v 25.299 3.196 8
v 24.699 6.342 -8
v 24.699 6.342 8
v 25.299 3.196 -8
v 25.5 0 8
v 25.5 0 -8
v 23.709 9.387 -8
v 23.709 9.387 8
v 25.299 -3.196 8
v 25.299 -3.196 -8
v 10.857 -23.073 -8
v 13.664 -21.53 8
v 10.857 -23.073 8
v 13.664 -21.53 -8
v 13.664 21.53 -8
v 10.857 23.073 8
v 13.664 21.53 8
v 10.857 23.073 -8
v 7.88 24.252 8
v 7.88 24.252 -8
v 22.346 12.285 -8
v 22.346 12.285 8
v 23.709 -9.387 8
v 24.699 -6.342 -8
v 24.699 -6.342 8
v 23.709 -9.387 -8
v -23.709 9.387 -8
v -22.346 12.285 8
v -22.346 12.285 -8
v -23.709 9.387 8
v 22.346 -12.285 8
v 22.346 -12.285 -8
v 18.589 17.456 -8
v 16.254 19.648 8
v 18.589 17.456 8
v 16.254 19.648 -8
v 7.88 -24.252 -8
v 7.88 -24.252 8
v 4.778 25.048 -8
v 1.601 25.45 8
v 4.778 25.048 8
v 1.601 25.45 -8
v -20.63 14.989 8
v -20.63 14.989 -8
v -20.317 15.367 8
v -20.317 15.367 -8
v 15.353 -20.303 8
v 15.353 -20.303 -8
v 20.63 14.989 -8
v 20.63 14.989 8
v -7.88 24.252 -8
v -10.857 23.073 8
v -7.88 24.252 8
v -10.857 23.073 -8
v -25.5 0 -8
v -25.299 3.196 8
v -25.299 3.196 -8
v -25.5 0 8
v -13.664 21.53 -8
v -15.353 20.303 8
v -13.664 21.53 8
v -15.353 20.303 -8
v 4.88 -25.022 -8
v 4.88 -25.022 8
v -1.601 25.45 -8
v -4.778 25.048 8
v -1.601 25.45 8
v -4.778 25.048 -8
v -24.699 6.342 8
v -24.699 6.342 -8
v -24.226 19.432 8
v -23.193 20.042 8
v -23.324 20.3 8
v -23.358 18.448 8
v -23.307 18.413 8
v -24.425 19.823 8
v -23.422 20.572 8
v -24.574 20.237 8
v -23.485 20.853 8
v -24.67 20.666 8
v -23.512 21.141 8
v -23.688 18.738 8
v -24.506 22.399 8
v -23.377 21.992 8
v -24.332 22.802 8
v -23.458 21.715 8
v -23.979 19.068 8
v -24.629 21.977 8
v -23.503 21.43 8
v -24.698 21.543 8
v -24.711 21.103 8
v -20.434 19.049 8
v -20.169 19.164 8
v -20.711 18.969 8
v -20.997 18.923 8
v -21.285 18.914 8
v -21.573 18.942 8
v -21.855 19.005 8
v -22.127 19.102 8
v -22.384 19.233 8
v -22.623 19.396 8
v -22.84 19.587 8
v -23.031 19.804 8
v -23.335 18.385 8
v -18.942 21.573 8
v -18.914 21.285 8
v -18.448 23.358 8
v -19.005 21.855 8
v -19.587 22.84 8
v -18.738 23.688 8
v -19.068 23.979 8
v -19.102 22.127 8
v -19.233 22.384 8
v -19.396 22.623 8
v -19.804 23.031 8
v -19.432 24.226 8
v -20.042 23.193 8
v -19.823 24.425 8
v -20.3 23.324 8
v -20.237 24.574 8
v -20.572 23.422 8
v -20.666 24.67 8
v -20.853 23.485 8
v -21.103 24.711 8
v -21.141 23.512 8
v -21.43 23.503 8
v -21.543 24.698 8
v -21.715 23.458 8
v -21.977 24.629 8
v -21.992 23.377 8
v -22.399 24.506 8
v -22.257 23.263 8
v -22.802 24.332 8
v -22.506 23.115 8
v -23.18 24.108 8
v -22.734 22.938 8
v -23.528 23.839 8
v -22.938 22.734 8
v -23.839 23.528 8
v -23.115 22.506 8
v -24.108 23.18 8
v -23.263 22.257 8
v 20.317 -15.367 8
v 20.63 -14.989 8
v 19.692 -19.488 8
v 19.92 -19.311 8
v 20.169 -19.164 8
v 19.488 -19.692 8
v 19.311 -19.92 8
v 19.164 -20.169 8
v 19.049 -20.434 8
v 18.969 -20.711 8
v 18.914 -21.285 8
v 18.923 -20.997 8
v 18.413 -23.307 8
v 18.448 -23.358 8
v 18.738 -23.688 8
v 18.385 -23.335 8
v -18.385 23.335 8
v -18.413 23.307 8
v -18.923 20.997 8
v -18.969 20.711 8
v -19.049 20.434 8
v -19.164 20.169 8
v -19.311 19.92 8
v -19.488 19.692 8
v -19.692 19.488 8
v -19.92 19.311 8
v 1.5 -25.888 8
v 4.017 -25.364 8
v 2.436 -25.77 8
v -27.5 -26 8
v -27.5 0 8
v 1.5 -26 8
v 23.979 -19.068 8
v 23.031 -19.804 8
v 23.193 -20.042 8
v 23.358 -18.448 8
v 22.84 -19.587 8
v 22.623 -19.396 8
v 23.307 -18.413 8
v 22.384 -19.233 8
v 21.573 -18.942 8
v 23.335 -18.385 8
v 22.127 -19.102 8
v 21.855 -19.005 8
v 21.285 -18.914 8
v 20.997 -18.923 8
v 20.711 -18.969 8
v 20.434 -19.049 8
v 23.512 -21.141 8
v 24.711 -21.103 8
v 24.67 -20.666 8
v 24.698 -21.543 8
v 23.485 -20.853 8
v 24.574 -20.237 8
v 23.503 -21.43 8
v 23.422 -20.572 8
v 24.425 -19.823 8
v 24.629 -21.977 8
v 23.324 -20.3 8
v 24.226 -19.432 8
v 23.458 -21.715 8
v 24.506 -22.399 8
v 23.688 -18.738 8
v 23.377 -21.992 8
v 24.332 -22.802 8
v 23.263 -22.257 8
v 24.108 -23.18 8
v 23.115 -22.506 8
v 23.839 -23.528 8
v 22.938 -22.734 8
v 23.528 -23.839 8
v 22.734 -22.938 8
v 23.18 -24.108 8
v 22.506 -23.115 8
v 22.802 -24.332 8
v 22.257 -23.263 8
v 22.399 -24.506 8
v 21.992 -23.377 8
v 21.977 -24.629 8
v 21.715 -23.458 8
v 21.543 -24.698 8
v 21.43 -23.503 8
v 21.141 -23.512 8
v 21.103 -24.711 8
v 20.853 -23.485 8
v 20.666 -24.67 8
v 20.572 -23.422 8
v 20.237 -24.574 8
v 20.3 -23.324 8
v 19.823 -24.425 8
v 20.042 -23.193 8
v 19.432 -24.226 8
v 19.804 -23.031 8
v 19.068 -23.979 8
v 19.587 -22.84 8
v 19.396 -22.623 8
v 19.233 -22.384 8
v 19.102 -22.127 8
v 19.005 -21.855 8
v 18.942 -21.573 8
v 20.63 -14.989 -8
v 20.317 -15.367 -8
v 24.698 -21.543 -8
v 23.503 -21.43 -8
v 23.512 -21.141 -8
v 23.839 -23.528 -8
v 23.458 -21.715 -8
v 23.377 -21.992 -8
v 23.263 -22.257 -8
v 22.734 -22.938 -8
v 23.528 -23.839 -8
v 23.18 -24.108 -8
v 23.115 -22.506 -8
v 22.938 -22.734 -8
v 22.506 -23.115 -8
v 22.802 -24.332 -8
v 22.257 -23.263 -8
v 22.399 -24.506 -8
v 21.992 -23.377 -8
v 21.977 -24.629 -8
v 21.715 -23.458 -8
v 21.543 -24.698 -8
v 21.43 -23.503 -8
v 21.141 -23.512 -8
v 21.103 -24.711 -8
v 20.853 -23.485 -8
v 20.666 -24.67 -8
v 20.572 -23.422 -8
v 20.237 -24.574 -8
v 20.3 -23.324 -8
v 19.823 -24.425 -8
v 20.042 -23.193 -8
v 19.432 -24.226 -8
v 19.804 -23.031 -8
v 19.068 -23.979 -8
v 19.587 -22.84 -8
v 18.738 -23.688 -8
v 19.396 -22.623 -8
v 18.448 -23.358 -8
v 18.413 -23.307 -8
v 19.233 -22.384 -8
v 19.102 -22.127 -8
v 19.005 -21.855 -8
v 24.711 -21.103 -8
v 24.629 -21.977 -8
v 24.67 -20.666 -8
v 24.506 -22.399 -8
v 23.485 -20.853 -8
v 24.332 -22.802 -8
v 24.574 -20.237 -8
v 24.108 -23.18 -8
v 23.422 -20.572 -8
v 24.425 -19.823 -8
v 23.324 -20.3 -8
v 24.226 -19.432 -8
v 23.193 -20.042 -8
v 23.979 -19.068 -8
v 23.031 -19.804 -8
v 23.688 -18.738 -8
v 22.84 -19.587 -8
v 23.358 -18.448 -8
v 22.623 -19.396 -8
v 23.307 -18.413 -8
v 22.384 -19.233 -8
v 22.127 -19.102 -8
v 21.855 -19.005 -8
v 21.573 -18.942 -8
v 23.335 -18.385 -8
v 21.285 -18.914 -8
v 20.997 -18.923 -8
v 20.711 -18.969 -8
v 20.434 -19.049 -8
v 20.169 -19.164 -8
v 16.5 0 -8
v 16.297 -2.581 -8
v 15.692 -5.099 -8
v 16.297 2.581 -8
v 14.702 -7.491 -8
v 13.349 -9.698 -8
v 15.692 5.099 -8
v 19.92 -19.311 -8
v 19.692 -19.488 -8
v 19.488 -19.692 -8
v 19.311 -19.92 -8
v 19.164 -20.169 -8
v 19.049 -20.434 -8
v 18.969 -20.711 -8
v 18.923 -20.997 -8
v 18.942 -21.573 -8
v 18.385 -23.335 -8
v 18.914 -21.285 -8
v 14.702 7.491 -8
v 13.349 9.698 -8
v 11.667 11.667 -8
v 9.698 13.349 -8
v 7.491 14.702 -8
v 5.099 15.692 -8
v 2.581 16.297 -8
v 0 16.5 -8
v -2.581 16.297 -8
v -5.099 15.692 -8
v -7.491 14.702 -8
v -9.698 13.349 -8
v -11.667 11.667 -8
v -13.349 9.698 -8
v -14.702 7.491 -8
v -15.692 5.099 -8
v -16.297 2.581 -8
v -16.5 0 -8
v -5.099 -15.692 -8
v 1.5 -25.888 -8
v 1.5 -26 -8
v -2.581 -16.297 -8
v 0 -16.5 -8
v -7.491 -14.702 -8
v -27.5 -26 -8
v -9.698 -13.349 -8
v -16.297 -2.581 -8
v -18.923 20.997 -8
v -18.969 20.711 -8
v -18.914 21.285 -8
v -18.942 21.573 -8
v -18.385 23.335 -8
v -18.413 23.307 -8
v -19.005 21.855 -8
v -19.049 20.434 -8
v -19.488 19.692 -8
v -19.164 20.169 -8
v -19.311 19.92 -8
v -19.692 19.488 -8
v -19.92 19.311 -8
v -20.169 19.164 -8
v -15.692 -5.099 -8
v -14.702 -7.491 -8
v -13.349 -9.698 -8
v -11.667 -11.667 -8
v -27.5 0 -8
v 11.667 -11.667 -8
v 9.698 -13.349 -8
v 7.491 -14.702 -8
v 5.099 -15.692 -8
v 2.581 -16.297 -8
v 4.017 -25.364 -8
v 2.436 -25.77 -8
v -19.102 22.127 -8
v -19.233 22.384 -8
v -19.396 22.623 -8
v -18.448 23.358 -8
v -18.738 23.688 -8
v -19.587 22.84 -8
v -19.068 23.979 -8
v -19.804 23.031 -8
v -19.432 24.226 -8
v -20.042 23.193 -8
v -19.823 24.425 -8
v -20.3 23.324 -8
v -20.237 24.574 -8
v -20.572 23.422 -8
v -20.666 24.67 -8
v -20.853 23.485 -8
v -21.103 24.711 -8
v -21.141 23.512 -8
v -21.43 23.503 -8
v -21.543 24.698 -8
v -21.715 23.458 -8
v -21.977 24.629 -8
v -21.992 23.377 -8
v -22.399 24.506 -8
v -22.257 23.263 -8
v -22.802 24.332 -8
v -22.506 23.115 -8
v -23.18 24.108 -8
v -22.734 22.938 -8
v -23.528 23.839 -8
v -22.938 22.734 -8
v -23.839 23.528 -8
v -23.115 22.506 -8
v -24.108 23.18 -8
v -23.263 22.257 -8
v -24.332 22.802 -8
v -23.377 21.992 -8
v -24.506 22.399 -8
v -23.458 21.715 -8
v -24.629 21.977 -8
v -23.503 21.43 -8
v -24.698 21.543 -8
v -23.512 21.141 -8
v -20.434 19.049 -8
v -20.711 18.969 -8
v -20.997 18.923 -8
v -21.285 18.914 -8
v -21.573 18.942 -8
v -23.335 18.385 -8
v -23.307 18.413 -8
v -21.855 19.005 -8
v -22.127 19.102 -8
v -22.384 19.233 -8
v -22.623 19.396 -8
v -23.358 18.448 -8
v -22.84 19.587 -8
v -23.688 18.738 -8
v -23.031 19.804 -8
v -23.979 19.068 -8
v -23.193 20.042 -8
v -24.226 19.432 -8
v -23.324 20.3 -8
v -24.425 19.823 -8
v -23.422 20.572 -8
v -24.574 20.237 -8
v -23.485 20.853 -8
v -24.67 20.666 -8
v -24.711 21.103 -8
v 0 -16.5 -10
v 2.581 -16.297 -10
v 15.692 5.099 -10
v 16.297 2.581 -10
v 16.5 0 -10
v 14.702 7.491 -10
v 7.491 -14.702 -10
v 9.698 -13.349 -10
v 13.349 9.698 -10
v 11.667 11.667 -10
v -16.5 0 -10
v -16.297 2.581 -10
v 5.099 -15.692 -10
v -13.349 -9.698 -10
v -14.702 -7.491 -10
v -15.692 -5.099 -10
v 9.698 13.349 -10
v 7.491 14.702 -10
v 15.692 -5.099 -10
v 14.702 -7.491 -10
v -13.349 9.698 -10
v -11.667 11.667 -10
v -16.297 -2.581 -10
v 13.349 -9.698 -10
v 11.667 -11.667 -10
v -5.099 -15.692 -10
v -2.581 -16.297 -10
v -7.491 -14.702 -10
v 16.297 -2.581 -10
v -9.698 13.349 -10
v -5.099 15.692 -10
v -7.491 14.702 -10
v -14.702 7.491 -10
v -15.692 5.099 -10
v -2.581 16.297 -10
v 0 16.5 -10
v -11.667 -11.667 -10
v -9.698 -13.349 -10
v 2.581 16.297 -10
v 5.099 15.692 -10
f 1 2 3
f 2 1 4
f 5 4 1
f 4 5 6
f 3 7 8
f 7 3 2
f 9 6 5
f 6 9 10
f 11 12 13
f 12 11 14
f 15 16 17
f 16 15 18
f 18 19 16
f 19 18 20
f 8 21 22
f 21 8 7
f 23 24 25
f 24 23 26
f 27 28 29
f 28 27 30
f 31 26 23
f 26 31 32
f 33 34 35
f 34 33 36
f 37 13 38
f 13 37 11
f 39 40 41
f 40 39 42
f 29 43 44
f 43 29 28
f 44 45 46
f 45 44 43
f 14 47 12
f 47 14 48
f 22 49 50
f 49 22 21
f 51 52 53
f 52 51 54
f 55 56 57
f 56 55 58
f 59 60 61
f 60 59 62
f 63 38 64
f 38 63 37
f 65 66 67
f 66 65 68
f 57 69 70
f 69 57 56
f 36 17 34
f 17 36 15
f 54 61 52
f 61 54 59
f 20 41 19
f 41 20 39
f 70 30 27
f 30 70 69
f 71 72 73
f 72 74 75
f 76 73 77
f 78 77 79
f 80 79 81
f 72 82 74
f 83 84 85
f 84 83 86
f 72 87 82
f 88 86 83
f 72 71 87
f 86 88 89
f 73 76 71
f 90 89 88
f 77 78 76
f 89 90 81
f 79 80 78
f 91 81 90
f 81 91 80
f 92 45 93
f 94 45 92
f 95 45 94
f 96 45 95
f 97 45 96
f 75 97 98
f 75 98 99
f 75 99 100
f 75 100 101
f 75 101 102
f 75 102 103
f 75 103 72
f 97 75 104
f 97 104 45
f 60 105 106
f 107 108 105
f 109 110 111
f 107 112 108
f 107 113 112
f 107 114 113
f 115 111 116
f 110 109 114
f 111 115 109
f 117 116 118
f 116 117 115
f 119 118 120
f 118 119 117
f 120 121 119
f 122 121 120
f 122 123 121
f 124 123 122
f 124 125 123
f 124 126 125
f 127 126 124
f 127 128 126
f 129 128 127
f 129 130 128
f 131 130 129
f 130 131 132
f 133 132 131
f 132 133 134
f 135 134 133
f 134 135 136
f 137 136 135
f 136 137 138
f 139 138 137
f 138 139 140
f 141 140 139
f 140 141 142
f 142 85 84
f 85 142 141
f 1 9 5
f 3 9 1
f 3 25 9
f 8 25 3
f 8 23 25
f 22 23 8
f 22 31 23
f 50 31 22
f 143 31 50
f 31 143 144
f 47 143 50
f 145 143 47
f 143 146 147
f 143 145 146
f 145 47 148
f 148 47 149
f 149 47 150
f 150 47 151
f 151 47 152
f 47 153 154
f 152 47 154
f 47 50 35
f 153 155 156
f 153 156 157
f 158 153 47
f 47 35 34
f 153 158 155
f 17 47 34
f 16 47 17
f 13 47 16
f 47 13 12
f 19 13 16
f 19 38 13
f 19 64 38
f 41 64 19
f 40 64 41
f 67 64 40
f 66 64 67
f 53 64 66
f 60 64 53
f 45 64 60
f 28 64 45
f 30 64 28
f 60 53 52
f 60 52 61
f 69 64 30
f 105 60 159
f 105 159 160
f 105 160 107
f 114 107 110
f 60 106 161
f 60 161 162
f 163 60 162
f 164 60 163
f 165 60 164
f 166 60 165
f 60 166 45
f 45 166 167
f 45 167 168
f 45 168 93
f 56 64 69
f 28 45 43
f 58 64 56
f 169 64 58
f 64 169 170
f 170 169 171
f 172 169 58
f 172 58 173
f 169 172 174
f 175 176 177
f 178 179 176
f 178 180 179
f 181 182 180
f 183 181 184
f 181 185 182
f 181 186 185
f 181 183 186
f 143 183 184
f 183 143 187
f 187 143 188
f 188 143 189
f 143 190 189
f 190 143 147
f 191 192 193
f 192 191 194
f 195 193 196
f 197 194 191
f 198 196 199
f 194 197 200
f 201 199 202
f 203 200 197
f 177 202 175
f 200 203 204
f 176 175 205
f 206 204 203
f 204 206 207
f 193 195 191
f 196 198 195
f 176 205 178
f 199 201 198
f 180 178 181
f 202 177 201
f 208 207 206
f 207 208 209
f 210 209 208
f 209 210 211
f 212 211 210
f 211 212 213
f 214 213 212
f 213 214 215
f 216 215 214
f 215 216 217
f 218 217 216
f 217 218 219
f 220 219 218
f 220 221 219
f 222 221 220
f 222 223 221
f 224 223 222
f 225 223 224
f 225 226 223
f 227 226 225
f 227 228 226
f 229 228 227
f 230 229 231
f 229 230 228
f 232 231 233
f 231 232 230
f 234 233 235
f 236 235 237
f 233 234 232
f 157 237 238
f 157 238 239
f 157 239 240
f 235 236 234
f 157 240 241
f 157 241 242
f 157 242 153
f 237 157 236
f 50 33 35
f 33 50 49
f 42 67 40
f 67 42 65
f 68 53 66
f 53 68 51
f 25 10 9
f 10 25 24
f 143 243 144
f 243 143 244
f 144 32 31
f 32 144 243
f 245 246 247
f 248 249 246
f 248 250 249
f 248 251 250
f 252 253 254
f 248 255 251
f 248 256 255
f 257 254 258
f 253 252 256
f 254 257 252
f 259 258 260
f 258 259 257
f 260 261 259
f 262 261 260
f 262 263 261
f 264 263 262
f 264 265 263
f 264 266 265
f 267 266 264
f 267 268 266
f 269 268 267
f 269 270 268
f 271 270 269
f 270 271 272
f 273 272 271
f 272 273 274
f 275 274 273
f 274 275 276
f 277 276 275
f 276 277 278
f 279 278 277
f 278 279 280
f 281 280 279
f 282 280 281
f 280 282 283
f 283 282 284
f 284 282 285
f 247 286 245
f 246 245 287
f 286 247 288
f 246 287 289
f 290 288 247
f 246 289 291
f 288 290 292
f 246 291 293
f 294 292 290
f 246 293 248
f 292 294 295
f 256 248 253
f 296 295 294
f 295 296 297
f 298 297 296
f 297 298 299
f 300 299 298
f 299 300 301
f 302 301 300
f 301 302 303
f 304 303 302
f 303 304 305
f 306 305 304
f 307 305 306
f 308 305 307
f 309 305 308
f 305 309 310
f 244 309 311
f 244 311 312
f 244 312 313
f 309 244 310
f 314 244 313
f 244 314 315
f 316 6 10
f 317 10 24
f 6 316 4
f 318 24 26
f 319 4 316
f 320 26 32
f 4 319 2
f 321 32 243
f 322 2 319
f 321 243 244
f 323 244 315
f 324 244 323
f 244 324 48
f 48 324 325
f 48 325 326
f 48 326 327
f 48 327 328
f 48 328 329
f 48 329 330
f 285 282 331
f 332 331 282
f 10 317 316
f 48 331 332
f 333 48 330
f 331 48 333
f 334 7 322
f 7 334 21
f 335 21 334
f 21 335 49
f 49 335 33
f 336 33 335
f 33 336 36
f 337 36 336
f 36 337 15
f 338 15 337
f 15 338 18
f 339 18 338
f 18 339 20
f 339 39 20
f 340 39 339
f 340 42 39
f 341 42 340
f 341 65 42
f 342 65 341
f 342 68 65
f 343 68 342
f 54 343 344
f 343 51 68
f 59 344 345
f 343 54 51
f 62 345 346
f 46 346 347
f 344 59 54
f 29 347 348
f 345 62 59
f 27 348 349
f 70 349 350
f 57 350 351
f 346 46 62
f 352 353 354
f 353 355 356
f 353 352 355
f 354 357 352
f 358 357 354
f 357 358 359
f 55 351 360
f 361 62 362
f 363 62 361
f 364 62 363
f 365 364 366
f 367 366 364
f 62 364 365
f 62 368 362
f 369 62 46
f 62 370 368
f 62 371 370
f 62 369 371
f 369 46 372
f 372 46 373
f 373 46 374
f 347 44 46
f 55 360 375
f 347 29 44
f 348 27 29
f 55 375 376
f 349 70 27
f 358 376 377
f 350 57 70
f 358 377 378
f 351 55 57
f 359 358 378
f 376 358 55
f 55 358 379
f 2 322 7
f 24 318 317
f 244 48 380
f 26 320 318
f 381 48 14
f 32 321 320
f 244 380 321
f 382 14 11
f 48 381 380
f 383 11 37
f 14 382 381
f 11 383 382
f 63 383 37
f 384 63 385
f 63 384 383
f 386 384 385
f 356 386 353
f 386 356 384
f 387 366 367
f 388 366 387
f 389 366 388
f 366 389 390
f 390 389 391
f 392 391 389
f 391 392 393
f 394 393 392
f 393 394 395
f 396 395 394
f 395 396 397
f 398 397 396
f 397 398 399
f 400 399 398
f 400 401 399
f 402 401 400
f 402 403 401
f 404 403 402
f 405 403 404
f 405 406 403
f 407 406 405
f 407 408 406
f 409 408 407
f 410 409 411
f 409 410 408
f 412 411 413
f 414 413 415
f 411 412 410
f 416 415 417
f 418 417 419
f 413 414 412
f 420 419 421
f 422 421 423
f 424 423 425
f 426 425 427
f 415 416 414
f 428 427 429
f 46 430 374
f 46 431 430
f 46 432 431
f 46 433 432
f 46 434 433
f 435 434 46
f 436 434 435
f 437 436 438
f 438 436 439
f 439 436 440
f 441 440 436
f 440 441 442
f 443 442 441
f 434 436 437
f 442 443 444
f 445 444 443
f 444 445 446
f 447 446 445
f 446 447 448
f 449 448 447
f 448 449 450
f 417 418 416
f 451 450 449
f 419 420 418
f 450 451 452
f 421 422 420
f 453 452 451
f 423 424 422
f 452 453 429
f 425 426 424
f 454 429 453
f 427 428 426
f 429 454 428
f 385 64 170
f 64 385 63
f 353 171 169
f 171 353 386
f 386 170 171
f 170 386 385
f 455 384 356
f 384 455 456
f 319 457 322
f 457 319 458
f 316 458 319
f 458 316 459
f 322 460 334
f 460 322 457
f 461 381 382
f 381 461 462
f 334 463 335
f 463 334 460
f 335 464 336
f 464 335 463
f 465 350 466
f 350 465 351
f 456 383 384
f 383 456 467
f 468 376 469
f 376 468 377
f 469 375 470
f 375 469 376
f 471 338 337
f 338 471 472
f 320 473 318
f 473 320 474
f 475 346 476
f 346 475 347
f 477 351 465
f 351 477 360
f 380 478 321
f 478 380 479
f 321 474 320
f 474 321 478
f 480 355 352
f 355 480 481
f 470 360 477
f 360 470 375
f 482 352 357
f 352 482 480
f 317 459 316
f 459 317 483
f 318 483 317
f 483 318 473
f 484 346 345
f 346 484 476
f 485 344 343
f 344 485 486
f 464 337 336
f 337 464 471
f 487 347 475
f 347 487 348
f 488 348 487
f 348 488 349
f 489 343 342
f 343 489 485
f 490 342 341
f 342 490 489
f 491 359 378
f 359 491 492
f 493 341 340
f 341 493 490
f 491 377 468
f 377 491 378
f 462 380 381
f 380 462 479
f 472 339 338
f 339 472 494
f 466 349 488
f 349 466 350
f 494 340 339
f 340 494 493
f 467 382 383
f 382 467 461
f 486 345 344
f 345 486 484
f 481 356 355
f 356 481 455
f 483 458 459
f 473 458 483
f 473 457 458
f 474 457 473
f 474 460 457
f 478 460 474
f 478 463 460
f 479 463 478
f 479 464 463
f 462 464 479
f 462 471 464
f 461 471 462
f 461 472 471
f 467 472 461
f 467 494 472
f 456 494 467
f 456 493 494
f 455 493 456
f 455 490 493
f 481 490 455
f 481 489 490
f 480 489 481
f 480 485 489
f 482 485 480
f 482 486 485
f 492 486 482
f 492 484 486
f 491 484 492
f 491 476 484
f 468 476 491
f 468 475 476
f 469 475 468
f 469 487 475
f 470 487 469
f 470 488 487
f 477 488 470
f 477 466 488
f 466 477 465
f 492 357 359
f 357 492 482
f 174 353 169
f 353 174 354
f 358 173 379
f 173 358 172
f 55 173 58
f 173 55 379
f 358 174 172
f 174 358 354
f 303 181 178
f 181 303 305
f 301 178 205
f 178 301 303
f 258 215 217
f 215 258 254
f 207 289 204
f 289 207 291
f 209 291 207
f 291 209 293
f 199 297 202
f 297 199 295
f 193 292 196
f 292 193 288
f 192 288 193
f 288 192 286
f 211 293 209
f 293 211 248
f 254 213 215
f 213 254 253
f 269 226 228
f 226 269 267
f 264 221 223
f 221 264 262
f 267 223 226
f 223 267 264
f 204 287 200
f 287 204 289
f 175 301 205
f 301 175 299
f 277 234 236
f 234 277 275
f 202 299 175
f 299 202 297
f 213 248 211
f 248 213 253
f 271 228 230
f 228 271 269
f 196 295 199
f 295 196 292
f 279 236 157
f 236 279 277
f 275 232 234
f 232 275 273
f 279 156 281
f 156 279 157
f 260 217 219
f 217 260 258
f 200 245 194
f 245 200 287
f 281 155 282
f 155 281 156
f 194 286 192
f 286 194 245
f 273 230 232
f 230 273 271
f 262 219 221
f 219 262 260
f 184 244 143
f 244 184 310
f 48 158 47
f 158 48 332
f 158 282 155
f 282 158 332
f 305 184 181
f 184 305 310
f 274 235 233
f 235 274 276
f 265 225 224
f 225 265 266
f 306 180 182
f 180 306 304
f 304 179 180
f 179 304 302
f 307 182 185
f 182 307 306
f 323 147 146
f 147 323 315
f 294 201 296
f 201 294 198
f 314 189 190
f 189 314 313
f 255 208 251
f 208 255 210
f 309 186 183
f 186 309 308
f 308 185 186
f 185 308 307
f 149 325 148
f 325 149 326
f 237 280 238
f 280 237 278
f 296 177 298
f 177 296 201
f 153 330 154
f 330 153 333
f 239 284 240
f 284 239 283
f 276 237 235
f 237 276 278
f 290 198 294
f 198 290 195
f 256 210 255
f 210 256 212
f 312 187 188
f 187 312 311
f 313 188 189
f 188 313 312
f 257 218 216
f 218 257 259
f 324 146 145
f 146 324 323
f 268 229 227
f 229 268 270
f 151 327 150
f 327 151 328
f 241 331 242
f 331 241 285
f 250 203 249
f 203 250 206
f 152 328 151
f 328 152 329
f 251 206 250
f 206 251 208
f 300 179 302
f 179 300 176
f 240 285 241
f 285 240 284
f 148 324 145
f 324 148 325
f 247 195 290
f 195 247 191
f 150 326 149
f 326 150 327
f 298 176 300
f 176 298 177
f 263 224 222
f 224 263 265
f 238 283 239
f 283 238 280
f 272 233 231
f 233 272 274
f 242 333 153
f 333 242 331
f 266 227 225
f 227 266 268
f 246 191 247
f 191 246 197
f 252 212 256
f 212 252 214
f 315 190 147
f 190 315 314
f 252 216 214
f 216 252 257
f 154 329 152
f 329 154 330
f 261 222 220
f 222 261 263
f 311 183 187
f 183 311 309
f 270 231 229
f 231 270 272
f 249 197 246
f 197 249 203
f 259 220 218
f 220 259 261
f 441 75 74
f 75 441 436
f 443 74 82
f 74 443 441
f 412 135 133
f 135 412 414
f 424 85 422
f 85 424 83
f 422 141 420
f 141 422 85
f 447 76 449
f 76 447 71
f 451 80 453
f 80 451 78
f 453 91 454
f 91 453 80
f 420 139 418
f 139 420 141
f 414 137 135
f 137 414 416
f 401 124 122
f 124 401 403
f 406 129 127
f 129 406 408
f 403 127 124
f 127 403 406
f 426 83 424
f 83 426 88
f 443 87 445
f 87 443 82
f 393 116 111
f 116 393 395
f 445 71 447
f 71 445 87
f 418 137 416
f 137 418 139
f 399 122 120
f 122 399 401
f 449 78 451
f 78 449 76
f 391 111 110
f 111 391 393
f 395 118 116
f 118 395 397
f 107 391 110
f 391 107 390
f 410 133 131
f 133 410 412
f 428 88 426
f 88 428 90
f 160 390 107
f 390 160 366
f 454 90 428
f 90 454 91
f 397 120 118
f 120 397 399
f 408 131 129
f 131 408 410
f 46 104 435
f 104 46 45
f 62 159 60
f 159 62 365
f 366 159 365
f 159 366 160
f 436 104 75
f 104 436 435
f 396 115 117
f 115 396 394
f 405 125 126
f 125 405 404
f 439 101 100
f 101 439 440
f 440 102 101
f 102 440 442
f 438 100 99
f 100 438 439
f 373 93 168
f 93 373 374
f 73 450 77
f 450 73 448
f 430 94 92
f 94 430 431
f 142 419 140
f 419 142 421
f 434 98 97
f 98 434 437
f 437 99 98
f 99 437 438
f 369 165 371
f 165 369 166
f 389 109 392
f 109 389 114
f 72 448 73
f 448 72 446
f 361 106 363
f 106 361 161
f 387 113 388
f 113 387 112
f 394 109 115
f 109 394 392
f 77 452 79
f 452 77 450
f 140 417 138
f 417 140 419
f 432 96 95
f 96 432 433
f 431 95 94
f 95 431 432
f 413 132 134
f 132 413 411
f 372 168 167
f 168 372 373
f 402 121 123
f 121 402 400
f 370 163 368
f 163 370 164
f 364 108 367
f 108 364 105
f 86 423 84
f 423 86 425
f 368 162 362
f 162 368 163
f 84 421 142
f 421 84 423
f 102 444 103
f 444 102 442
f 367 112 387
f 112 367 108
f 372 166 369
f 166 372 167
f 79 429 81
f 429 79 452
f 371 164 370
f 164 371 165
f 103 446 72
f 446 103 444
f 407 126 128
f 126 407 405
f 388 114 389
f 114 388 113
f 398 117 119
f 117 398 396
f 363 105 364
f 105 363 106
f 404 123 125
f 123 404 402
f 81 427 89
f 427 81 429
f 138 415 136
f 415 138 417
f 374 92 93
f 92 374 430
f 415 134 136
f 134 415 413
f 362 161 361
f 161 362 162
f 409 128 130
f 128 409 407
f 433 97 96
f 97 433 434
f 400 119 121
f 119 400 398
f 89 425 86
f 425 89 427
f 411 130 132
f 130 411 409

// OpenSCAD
//Lüfter 12V WL5015

/* [Parameter] */
W = 52;
H = 16;

module body()
{
    $fn=50;
    cylinder(d=W-1,h=H,center=true);
    translate([0,-W/4,0])
    cylinder(d=W/2,h=H,center=true);
    translate([0,0,-2])
    cylinder(d=33,h=H,center=true, $fn=40);
}

module Lufter() 
{
    body();
    Auslass();
    rotate([0,0,-315])
    translate([0,-W/2-4,0])
    Befestigung();
    rotate([0,0,225])
    translate([0,-W/2-4,0])
    Befestigung();
}

module Auslass()
{
    translate([-W/4,-W/4,0])
    cube([W/2+3,W/2,H],center=true);
    Befestigung();
}

module Befestigung()
{
    $fn=50;
    difference()
    {
        union() 
        {
            cylinder(d=7,h=H,center=true);
            translate([0,4,0])
            cube([7,7,H],center=true);
        }
        cylinder(d=4.6,h=H+2,center=true);
    }

}
        
Lufter();
